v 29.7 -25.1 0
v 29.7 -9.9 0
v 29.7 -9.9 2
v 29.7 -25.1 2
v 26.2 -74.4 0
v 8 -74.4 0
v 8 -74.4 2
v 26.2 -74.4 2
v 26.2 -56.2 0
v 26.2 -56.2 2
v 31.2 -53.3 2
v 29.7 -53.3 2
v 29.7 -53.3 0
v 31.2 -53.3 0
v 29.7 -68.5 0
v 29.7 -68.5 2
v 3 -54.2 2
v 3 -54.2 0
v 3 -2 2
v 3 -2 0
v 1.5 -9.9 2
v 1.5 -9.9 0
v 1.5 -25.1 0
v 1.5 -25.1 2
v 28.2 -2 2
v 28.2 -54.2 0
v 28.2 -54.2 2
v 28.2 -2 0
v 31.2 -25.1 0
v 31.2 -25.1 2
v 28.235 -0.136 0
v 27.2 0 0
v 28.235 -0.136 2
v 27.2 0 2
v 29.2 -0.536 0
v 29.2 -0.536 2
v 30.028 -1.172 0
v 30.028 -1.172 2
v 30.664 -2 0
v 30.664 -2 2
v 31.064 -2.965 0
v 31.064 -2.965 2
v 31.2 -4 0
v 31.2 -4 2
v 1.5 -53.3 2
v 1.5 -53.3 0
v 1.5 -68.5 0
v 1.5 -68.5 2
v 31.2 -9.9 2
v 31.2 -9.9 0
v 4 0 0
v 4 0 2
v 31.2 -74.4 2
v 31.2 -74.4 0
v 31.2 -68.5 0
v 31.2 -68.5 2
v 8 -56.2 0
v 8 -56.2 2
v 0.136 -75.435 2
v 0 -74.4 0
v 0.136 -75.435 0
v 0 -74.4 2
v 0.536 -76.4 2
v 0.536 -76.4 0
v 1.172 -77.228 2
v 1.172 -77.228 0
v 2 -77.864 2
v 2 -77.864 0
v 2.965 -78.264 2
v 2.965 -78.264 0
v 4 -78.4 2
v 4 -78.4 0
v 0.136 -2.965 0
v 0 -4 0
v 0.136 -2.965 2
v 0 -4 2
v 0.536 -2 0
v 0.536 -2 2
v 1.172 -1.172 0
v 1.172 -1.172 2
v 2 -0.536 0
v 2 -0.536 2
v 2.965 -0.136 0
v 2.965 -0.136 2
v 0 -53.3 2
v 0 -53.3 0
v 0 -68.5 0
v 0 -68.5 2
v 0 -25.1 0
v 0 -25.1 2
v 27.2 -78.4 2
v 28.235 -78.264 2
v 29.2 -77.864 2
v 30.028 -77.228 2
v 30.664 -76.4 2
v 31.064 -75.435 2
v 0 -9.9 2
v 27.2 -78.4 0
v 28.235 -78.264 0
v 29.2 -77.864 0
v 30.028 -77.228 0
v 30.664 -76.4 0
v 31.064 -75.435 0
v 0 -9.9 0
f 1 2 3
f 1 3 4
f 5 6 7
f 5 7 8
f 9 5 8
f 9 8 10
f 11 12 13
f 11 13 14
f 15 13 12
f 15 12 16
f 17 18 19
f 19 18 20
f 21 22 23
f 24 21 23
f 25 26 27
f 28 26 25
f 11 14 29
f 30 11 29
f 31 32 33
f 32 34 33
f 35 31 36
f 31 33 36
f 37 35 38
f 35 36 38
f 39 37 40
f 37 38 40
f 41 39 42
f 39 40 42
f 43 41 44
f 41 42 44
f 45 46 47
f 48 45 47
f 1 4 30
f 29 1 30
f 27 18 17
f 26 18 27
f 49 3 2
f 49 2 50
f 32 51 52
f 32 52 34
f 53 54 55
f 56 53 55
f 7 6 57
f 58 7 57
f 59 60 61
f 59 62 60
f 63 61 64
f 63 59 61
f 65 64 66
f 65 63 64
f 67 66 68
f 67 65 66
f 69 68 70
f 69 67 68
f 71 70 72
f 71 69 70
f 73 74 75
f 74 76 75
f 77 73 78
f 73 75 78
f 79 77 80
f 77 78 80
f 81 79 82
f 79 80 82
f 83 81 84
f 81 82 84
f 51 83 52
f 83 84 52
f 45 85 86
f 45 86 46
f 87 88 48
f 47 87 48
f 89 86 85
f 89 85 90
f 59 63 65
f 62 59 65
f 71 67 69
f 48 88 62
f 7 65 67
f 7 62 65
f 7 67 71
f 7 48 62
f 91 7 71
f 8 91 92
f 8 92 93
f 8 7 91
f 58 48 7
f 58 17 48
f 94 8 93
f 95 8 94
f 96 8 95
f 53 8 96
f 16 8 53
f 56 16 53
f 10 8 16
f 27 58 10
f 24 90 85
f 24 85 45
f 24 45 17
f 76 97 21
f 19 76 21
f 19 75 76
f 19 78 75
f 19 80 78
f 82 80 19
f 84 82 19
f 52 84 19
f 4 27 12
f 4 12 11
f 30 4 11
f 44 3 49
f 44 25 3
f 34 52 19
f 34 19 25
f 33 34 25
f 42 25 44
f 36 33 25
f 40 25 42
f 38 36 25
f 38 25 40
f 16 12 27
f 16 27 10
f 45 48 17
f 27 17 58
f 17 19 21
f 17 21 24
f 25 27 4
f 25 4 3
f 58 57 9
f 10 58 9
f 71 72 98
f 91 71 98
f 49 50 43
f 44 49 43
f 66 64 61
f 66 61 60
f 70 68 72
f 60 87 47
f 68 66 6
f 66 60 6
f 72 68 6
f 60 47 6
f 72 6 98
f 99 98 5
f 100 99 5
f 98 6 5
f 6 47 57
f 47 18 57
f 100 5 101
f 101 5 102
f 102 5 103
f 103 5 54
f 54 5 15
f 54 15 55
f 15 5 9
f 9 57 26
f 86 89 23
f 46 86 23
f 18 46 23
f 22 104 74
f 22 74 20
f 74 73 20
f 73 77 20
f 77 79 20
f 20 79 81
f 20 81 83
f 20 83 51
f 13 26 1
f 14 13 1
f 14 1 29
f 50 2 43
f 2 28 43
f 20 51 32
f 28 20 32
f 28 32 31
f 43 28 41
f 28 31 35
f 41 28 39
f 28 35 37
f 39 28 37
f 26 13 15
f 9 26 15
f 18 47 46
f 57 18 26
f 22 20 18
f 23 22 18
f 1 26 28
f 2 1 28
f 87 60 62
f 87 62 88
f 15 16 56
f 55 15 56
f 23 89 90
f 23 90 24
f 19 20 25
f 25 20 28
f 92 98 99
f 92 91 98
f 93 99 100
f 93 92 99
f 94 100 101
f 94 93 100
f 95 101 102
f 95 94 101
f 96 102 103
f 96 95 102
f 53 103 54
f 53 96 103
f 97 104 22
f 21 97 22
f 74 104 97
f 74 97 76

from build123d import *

# Parameters (mm, degrees)
SKETCH_W        = 31.2
SKETCH_H        = 78.4
SKETCH_W_2      = 25.2
SKETCH_H_2      = 52.2
SKETCH_W_3      = 18.2
SKETCH_H_3      = 18.2
PAD_DEPTH       = 2
SKETCH007_W     = 11.282879
SKETCH007_H     = 15.2
SKETCH007_W_2   = 12.568334
SKETCH007_W_3   = 28.383078
SKETCH007_W_4   = 31.922889
POCKET002_DEPTH = 5
FILLET002_R     = 4


with BuildPart() as part:
    # Sketch → Pad (new body)
    with BuildSketch(Plane.XY):
        with Locations((15.6, -39.2)):
            Rectangle(SKETCH_W, SKETCH_H)
        with Locations((15.6, -28.1)):
            Rectangle(SKETCH_W_2, SKETCH_H_2, mode=Mode.SUBTRACT)
        with Locations((17.1, -65.3)):
            Rectangle(SKETCH_W_3, SKETCH_H_3, mode=Mode.SUBTRACT)
    extrude(amount=PAD_DEPTH)

    # Sketch007 (on Face13 of Pad) → Pocket002 (cut)
    with BuildSketch(Plane(origin=(0, 0, 0), x_dir=(1, 0, 0), z_dir=(0, 0, -1))):
        with Locations((-4.141439, 60.9)):
            Rectangle(SKETCH007_W, SKETCH007_H)
        with Locations((-4.784167, 17.5)):
            Rectangle(SKETCH007_W_2, SKETCH007_H)
        with Locations((43.891539, 60.9)):
            Rectangle(SKETCH007_W_3, SKETCH007_H)
        with Locations((45.661445, 17.5)):
            Rectangle(SKETCH007_W_4, SKETCH007_H)
    extrude(amount=-POCKET002_DEPTH, mode=Mode.SUBTRACT)

    # Fillet002
    fillet002_edges = [part.edges().sort_by_distance(p)[0] for p in [
        (31.2, 0, 1),
        (0, 0, 1),
        (0, -78.4, 1),
        (31.2, -78.4, 1),
    ]]
    fillet(fillet002_edges, radius=FILLET002_R)


solid = part.part
